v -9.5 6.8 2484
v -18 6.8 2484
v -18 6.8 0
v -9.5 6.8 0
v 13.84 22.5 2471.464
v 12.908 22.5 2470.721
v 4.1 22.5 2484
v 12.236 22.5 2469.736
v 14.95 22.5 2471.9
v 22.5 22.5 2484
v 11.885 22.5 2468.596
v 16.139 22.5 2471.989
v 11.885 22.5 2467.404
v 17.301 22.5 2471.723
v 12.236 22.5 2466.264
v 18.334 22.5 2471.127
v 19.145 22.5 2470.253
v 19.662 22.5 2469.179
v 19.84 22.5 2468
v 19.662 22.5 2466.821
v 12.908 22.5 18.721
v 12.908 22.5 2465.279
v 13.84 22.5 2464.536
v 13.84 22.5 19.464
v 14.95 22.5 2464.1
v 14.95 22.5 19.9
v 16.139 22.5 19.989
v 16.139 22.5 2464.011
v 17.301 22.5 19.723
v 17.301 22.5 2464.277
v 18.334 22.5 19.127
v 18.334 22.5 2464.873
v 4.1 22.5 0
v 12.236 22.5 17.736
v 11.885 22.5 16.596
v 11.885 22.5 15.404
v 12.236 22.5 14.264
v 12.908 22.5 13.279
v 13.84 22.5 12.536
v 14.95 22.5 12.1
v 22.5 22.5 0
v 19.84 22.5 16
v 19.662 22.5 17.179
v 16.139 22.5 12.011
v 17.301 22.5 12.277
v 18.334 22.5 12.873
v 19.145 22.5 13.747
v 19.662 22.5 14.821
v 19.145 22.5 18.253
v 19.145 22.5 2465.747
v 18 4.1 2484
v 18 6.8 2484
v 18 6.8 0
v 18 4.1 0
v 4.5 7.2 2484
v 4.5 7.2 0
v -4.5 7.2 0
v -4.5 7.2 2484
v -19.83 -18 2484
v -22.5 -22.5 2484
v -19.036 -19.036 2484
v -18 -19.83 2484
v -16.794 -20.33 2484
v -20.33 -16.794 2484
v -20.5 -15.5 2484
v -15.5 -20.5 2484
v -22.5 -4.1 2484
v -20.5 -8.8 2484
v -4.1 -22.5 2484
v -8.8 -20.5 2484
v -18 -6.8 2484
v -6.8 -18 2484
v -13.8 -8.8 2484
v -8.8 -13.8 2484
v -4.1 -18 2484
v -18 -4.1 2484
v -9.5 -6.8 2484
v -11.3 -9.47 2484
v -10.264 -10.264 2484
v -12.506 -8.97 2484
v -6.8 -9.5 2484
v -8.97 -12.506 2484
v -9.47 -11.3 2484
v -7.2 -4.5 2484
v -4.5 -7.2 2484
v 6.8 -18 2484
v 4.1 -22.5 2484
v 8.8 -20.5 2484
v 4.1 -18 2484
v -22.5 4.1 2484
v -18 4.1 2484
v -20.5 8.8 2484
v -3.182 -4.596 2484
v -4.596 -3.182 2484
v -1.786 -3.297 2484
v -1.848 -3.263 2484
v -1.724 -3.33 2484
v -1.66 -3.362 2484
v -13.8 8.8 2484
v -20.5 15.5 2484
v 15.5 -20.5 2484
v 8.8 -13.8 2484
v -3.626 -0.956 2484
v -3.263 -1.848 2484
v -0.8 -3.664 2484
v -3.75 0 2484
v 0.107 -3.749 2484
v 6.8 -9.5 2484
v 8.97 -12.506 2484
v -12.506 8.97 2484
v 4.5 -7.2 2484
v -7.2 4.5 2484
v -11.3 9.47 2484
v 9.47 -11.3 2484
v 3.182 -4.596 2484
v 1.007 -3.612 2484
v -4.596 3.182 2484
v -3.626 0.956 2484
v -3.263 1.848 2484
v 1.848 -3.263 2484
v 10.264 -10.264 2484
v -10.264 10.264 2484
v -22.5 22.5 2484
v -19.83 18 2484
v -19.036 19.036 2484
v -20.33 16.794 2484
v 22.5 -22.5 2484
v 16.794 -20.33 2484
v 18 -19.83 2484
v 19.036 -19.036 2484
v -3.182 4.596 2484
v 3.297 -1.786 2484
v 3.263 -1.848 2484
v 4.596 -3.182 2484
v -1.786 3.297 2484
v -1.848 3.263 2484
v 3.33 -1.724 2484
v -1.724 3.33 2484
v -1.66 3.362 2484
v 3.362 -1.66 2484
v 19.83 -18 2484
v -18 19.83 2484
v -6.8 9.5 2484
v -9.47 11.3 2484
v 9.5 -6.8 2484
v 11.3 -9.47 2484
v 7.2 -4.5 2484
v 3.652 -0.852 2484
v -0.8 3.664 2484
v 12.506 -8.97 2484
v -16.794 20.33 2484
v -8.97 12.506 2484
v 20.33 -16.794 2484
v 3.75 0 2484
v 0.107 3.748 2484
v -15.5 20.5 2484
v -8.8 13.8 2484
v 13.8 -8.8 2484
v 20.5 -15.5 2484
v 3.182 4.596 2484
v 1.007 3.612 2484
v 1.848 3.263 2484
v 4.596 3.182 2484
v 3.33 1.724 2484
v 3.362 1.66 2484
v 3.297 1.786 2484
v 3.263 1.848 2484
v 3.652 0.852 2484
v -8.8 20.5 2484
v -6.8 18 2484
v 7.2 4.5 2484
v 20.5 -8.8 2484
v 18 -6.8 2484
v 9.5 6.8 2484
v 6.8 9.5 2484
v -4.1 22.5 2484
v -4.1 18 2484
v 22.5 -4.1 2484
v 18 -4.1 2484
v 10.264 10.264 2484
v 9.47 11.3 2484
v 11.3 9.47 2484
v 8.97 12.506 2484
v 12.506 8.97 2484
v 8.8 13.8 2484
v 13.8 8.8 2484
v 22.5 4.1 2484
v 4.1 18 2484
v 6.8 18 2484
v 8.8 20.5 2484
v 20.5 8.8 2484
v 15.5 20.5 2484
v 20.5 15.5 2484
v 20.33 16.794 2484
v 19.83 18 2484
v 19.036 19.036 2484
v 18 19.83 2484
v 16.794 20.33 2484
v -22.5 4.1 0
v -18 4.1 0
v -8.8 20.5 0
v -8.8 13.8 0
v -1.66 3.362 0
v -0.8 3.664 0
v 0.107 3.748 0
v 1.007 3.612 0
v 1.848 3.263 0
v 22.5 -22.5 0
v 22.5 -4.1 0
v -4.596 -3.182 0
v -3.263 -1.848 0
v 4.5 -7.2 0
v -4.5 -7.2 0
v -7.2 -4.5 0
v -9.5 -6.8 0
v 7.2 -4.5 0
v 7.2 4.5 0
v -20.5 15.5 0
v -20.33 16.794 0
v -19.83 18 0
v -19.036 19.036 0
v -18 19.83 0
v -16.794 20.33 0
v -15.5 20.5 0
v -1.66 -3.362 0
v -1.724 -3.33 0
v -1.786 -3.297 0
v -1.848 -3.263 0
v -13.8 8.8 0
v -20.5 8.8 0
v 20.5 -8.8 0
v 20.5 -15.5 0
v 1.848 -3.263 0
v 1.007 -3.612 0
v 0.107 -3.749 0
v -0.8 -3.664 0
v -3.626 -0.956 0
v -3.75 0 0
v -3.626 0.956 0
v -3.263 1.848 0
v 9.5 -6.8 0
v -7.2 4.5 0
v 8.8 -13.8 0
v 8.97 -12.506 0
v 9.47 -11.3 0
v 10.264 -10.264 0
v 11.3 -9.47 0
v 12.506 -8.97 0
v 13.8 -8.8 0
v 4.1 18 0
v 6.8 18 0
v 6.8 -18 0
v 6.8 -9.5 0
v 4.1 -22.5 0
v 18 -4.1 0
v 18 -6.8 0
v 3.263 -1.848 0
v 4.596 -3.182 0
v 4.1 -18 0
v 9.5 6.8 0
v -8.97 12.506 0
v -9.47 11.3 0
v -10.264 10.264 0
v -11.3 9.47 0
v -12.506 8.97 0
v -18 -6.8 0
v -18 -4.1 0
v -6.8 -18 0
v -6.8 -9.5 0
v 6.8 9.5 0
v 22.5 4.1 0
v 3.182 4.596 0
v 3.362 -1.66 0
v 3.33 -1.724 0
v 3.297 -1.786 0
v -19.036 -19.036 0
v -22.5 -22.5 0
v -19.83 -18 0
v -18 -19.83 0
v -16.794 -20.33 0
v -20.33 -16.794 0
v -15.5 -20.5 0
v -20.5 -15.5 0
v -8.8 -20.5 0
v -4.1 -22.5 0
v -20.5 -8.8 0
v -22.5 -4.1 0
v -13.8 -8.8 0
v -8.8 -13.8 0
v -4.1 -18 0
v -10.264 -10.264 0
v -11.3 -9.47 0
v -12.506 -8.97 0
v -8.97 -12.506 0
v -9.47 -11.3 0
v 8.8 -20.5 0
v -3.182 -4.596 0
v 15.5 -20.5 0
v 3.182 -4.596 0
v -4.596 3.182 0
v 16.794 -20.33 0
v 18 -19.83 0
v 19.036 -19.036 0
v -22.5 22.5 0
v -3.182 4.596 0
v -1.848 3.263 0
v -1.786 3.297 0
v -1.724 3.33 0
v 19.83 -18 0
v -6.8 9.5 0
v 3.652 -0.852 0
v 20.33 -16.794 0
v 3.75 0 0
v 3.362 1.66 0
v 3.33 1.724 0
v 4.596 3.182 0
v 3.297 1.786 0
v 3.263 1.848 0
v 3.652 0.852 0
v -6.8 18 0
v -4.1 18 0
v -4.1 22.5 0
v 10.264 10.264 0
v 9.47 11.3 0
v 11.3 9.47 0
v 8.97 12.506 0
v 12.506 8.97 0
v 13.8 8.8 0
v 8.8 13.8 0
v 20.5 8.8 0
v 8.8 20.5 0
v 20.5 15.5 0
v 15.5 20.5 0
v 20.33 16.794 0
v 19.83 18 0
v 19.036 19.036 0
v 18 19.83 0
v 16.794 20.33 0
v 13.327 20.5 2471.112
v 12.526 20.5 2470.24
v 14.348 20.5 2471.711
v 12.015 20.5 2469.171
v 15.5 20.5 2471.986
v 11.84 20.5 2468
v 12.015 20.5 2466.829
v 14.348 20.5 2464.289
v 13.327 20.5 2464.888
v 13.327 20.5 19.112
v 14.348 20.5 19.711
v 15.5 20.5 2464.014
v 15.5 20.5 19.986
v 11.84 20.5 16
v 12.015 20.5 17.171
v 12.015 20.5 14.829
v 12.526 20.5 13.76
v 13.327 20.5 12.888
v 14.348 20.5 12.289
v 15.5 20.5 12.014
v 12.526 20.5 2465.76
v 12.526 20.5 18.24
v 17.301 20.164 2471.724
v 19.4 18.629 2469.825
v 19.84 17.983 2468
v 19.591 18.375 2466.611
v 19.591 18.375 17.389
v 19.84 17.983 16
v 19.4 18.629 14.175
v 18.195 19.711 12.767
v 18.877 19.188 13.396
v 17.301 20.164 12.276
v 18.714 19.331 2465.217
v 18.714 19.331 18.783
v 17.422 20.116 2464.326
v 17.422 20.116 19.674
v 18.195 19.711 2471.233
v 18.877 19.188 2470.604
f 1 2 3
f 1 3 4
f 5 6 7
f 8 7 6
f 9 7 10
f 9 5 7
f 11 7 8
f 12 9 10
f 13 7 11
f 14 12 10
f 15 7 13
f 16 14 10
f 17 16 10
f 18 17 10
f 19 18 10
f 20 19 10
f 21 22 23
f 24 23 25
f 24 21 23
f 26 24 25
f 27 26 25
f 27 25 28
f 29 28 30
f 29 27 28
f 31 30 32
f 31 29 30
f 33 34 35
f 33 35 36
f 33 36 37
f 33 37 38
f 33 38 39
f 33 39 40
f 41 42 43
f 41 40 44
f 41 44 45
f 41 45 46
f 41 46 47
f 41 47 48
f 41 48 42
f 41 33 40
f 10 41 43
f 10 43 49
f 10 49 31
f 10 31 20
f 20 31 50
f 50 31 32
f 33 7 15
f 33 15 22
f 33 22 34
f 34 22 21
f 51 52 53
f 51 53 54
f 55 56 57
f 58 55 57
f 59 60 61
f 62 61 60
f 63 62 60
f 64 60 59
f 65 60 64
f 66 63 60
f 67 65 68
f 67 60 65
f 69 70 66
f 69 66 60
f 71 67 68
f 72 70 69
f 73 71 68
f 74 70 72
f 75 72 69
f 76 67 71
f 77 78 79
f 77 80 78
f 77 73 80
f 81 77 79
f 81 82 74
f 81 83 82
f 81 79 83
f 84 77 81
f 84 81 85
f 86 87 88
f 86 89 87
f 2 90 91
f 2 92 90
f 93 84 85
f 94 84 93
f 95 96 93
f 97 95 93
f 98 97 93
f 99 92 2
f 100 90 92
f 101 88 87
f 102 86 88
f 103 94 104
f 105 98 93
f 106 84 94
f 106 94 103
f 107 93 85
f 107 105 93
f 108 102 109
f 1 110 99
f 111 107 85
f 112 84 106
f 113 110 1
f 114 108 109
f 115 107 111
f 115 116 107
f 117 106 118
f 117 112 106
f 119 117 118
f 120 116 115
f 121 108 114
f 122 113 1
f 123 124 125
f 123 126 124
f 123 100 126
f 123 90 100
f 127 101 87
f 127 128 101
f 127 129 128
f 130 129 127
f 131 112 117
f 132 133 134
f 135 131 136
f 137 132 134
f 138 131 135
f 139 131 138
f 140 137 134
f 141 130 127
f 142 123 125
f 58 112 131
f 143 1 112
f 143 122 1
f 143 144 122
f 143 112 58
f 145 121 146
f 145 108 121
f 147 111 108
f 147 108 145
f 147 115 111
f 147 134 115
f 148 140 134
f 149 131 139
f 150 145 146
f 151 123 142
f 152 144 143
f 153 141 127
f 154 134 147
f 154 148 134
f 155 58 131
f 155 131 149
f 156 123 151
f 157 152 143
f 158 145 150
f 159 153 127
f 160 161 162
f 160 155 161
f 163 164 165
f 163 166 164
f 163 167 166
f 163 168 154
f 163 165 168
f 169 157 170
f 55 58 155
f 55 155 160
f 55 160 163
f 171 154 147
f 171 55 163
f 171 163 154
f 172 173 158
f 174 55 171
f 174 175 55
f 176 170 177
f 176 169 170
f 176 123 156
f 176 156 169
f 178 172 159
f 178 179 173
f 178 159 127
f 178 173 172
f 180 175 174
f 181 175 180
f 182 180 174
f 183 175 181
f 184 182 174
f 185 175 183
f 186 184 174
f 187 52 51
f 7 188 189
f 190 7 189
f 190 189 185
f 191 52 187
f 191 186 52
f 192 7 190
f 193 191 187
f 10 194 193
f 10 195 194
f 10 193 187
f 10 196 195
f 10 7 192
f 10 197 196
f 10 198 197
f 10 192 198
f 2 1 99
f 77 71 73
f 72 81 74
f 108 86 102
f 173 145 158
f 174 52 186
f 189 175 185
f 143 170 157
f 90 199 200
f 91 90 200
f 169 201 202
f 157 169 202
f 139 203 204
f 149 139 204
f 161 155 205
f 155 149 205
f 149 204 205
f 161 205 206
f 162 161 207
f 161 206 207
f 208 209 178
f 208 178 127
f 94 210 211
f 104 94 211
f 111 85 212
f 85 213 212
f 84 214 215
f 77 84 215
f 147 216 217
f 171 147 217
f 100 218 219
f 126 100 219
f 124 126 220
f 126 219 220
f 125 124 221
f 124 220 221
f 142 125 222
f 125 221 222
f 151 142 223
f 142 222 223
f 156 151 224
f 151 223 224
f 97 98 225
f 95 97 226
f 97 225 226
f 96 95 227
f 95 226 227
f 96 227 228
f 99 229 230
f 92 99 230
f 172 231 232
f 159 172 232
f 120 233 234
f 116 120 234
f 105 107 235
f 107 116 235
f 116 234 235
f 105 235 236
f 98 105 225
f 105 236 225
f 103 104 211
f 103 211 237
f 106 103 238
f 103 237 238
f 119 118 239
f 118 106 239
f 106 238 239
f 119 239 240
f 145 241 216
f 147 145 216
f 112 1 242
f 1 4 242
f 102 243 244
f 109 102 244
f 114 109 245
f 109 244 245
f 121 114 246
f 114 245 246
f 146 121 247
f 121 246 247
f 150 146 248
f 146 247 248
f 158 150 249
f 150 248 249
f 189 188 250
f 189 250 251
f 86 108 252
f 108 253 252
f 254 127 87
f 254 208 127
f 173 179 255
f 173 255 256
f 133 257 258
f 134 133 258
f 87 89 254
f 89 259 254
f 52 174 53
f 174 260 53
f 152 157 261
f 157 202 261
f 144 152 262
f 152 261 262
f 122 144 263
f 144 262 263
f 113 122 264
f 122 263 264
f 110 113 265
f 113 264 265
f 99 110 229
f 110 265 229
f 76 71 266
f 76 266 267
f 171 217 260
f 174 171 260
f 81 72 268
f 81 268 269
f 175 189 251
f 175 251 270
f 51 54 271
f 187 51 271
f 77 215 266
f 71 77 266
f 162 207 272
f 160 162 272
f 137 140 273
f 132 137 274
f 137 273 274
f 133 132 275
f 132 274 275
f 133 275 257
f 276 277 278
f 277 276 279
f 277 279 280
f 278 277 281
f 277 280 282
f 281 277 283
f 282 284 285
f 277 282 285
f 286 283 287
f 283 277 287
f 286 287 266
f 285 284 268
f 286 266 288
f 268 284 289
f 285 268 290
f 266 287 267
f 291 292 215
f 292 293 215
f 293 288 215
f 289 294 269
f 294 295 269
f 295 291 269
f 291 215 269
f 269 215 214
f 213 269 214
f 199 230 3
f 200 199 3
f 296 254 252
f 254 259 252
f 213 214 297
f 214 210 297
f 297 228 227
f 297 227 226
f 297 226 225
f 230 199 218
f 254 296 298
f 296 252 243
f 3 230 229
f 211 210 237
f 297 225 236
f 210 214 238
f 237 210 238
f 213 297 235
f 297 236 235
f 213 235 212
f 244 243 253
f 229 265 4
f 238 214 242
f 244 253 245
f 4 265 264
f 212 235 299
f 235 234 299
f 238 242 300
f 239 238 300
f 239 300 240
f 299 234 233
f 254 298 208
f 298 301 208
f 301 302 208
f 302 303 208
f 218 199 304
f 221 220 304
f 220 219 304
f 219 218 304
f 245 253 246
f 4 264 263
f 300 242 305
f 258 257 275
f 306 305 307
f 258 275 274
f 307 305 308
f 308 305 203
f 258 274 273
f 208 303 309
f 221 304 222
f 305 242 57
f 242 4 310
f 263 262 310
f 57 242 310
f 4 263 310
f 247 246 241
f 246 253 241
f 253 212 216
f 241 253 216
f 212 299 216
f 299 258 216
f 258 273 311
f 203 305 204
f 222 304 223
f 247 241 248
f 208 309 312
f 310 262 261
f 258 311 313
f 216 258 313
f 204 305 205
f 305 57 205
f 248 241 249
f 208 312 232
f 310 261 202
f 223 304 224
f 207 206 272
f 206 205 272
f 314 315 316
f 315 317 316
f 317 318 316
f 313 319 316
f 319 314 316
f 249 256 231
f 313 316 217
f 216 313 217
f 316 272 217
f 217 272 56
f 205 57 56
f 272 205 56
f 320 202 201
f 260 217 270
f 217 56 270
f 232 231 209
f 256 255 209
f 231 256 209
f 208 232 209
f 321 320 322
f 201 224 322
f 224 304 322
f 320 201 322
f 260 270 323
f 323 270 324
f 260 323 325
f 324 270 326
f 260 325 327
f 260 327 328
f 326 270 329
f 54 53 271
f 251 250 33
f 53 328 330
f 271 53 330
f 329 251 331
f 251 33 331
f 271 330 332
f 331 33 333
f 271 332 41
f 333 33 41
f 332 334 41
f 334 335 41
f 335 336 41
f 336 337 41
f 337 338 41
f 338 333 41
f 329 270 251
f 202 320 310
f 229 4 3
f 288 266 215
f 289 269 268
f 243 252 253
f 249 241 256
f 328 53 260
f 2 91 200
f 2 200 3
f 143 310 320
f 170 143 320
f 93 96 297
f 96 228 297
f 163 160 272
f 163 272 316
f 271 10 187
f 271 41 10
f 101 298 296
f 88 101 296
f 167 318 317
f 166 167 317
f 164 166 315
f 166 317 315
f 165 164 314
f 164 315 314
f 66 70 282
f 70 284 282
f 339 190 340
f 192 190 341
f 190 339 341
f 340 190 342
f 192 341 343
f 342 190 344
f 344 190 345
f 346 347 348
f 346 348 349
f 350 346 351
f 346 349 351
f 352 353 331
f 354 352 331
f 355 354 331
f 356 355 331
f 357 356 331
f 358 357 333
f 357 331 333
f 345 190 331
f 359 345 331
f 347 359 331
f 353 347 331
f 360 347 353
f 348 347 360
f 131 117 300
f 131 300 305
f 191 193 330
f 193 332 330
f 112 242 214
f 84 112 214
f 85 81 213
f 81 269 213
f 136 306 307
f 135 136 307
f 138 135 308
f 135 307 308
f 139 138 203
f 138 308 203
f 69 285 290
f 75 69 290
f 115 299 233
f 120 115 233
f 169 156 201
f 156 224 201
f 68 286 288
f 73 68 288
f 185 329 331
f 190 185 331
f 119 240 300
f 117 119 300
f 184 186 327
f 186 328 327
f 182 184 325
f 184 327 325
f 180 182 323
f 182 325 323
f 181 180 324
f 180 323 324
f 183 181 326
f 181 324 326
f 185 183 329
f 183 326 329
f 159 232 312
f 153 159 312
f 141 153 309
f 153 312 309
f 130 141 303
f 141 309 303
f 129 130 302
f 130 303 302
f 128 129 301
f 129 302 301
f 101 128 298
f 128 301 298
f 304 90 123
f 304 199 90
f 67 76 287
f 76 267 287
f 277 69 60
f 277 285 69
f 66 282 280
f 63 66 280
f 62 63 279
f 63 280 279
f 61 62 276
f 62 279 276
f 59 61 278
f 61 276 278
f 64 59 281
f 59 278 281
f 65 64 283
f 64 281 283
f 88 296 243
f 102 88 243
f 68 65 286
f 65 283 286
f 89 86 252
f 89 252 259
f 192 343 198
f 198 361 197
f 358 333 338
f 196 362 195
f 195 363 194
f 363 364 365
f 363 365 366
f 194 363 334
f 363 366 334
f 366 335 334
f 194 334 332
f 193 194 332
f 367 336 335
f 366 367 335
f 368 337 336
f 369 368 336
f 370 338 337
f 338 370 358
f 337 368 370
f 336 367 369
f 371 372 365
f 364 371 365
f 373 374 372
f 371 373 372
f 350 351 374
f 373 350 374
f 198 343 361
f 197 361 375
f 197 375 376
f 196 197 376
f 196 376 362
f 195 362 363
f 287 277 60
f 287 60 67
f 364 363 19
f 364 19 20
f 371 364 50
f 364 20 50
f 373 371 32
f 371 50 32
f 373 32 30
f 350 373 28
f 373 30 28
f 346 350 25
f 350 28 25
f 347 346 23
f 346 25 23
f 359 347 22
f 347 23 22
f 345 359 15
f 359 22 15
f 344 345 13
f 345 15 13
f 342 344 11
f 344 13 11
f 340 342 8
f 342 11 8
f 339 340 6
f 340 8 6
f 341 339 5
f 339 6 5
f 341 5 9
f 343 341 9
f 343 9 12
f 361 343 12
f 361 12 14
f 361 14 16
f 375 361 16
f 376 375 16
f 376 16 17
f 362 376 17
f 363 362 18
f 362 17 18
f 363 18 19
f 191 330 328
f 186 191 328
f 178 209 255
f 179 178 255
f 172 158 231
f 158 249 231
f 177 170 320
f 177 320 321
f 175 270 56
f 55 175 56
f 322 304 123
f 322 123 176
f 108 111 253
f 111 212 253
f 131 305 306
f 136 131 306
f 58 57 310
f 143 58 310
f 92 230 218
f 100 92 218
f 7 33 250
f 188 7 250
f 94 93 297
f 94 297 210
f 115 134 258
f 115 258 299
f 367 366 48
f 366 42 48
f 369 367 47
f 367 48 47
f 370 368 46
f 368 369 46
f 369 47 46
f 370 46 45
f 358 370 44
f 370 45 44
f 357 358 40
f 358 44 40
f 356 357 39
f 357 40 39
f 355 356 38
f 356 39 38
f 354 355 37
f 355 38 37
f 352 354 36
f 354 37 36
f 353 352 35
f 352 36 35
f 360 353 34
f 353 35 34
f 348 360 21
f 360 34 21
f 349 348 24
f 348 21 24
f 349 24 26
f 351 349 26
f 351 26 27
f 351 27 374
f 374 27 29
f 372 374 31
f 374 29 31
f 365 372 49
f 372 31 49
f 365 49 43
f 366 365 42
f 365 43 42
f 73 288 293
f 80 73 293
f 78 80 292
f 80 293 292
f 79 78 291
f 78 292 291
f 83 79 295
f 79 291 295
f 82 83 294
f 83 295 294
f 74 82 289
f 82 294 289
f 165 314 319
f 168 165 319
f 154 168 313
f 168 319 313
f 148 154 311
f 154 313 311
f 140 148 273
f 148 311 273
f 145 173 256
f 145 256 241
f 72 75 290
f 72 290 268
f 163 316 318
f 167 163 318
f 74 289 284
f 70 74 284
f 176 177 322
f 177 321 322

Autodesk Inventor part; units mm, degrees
ref_plane "YZ Plane" through (0, 0, 0) normal (1, 0, 0) x (0, 1, 0)
ref_plane "XZ Plane" through (0, 0, 0) normal (0, 1, 0) x (-1, 0, 0)
ref_plane "XY Plane" through (0, 0, 0) normal (0, 0, 1) x (1, 0, 0)
sketch "Sketch1" plane through (0, 0, 0) normal (0, 0, 1) x (1, 0, 0)
  line L0 (-4.1, -22.5) -> (-4.1, -18)
  line L1 (-4.6, -18) -> (-6.8, -18)
  line L2 (-6.8, -18) -> (-6.8, -9.5)
  line L3 (-6.8, -9.5) -> (-4.5, -7.2)
  line L4 (-4.5, -7.2) -> (4.5, -7.2)
  line L5 (4.5, -7.2) -> (6.8, -9.5)
  line L6 (6.8, -9.5) -> (6.8, -18)
  line L7 (4.1, -18) -> (4.1, -22.5)
  line L8 (22.5, -4.1) -> (18, -4.1)
  line L9 (18, -4.6) -> (18, -6.8)
  line L10 (18, -6.8) -> (9.5, -6.8)
  line L11 (9.5, -6.8) -> (7.2, -4.5)
  line L12 (7.2, -4.5) -> (7.2, 4.5)
  line L13 (7.2, 4.5) -> (9.5, 6.8)
  line L14 (9.5, 6.8) -> (18, 6.8)
  line L15 (18, 4.1) -> (22.5, 4.1)
  line L16 (22.5, 22.5) -> (22.5, 4.4)
  line L17 (4.1, 22.5) -> (4.1, 18)
  line L18 (4.6, 18) -> (6.8, 18)
  line L19 (6.8, 18) -> (6.8, 9.5)
  line L20 (6.8, 9.5) -> (4.5, 7.2)
  line L21 (4.5, 7.2) -> (-4.5, 7.2)
  line L22 (-4.5, 7.2) -> (-6.8, 9.5)
  line L23 (-6.8, 9.5) -> (-6.8, 18)
  line L24 (-4.1, 18) -> (-4.1, 22.5)
  line L25 (-22.5, 22.5) -> (-4.4, 22.5)
  line L26 (-22.5, 4.1) -> (-18, 4.1)
  line L27 (-18, 6.8) -> (-9.5, 6.8)
  line L28 (-9.5, 6.8) -> (-7.2, 4.5)
  line L29 (-7.2, 4.5) -> (-7.2, -4.5)
  line L30 (-7.2, -4.5) -> (-9.5, -6.8)
  line L31 (-9.5, -6.8) -> (-18, -6.8)
  line L32 (-18, -6.8) -> (-18, -4.6)
  line L33 (-18, -4.1) -> (-22.5, -4.1)
  line L34 (-22.5, -22.5) -> (-22.5, -4.4)
  line L35 (-4.4, -22.5) -> (-22.5, -22.5)
  line L36 (-4.5962, -3.182) -> (-3.2627, -1.8485)
  line L37 (-3.2627, 1.8485) -> (-4.5962, 3.182)
  line L38 (-4.5962, 3.182) -> (-3.182, 4.5962)
  line L39 (-3.182, 4.5962) -> (-1.8485, 3.2627)
  line L40 (1.8485, 3.2627) -> (3.182, 4.5962)
  line L41 (3.182, 4.5962) -> (4.5962, 3.182)
  line L42 (4.5962, 3.182) -> (3.2627, 1.8485)
  arc A0 (3.3625, -1.6602) -> (3.3625, 1.6602) centre (0, 0) ccw
  line L43 (3.2627, -1.8485) -> (4.5962, -3.182)
  line L44 (4.5962, -3.182) -> (3.182, -4.5962)
  line L45 (3.182, -4.5962) -> (1.8485, -3.2627)
  line L46 (-1.8485, -3.2627) -> (-3.182, -4.5962)
  line L47 (-3.182, -4.5962) -> (-4.5962, -3.182)
  arc A1 (13.8, -8.8) -> (8.8, -13.8) centre (13.8, -13.8) ccw
  line L48 (13.8, -8.8) -> (20.5, -8.8)
  line L49 (20.5, -8.8) -> (20.5, -15.5)
  arc A2 (15.5, -20.5) -> (20.5, -15.5) centre (15.5, -15.5) ccw
  line L50 (15.5, -20.5) -> (8.8, -20.5)
  line L51 (8.8, -20.5) -> (8.8, -13.8)
  arc A3 (8.8, 13.8) -> (13.8, 8.8) centre (13.8, 13.8) ccw
  line L52 (8.8, 13.8) -> (8.8, 20.5)
  line L53 (8.8, 20.5) -> (15.5, 20.5)
  arc A4 (20.5, 15.5) -> (15.5, 20.5) centre (15.5, 15.5) ccw
  line L54 (20.5, 15.5) -> (20.5, 8.8)
  line L55 (20.5, 8.8) -> (13.8, 8.8)
  arc A5 (-13.8, 8.8) -> (-8.8, 13.8) centre (-13.8, 13.8) ccw
  line L56 (-13.8, 8.8) -> (-20.5, 8.8)
  line L57 (-20.5, 8.8) -> (-20.5, 15.5)
  arc A6 (-15.5, 20.5) -> (-20.5, 15.5) centre (-15.5, 15.5) ccw
  line L58 (-15.5, 20.5) -> (-8.8, 20.5)
  line L59 (-8.8, 20.5) -> (-8.8, 13.8)
  arc A7 (-8.8, -13.8) -> (-13.8, -8.8) centre (-13.8, -13.8) ccw
  line L60 (-8.8, -13.8) -> (-8.8, -20.5)
  line L61 (-8.8, -20.5) -> (-15.5, -20.5)
  arc A8 (-20.5, -15.5) -> (-15.5, -20.5) centre (-15.5, -15.5) ccw
  line L62 (-20.5, -15.5) -> (-20.5, -8.8)
  line L63 (-20.5, -8.8) -> (-13.8, -8.8)
  line L64 (-6.8, 18) -> (-4.1, 18)
  line L65 (4.1, 18) -> (4.6, 18)
  line L66 (-4.4, 22.5) -> (-4.1, 22.5)
  line L67 (4.1, 22.5) -> (22.5, 22.5)
  arc A9 (3.3625, 1.6602) -> (3.2627, 1.8485) centre (0, 0) ccw
  arc A10 (1.8485, 3.2627) -> (-1.6602, 3.3625) centre (0, 0) ccw
  arc A11 (-1.6602, 3.3625) -> (-1.8485, 3.2627) centre (0, 0) ccw
  arc A12 (-3.2627, 1.8485) -> (-3.2627, -1.8485) centre (0, 0) ccw
  arc A13 (-1.8485, -3.2627) -> (-1.6602, -3.3625) centre (0, 0) ccw
  arc A14 (-1.6602, -3.3625) -> (1.8485, -3.2627) centre (0, 0) ccw
  arc A15 (3.2627, -1.8485) -> (3.3625, -1.6602) centre (0, 0) ccw
  line L68 (18, 6.8) -> (18, 4.1)
  line L69 (18, -4.1) -> (18, -4.6)
  line L70 (22.5, 4.4) -> (22.5, 4.1)
  line L71 (22.5, -4.1) -> (22.5, -22.5)
  line L72 (6.8, -18) -> (4.1, -18)
  line L73 (-4.1, -18) -> (-4.6, -18)
  line L74 (22.5, -22.5) -> (4.1, -22.5)
  line L75 (-4.1, -22.5) -> (-4.4, -22.5)
  line L76 (-22.5, -4.4) -> (-22.5, -4.1)
  line L77 (-22.5, 4.1) -> (-22.5, 22.5)
  line L78 (-18, -4.6) -> (-18, -4.1)
  line L79 (-18, 4.1) -> (-18, 6.8)
extrude "Extrusion1" add sketch "Sketch1" along normal blind 2484
ref_plane "Work Plane1" through (0, 0, 1242) normal (0, 0, -1) x (-1, 0, 0)
sketch "Sketch5" plane through (-22.5, 22.5, 2484) normal (0, 1, 0) x (1, 0, 0)
  line L0 (45, 2484) -> (45, 0) projected
  line L1 (45, 0) -> (26.6, 0) projected
  circle A0 centre (38.3401, 16) radius 4
  point P0 (22.5, 2484)
  dimension "d19" = 8
  dimension "d20" = 16
extrude "Extrusion5" cut sketch "Sketch5" against normal up to next
mirror "Mirror4" about plane through (0, 0, 1242) normal (0, 0, -1) of "Extrusion5"
properties part number "20.1033.0" material "Aluminum-6061"
